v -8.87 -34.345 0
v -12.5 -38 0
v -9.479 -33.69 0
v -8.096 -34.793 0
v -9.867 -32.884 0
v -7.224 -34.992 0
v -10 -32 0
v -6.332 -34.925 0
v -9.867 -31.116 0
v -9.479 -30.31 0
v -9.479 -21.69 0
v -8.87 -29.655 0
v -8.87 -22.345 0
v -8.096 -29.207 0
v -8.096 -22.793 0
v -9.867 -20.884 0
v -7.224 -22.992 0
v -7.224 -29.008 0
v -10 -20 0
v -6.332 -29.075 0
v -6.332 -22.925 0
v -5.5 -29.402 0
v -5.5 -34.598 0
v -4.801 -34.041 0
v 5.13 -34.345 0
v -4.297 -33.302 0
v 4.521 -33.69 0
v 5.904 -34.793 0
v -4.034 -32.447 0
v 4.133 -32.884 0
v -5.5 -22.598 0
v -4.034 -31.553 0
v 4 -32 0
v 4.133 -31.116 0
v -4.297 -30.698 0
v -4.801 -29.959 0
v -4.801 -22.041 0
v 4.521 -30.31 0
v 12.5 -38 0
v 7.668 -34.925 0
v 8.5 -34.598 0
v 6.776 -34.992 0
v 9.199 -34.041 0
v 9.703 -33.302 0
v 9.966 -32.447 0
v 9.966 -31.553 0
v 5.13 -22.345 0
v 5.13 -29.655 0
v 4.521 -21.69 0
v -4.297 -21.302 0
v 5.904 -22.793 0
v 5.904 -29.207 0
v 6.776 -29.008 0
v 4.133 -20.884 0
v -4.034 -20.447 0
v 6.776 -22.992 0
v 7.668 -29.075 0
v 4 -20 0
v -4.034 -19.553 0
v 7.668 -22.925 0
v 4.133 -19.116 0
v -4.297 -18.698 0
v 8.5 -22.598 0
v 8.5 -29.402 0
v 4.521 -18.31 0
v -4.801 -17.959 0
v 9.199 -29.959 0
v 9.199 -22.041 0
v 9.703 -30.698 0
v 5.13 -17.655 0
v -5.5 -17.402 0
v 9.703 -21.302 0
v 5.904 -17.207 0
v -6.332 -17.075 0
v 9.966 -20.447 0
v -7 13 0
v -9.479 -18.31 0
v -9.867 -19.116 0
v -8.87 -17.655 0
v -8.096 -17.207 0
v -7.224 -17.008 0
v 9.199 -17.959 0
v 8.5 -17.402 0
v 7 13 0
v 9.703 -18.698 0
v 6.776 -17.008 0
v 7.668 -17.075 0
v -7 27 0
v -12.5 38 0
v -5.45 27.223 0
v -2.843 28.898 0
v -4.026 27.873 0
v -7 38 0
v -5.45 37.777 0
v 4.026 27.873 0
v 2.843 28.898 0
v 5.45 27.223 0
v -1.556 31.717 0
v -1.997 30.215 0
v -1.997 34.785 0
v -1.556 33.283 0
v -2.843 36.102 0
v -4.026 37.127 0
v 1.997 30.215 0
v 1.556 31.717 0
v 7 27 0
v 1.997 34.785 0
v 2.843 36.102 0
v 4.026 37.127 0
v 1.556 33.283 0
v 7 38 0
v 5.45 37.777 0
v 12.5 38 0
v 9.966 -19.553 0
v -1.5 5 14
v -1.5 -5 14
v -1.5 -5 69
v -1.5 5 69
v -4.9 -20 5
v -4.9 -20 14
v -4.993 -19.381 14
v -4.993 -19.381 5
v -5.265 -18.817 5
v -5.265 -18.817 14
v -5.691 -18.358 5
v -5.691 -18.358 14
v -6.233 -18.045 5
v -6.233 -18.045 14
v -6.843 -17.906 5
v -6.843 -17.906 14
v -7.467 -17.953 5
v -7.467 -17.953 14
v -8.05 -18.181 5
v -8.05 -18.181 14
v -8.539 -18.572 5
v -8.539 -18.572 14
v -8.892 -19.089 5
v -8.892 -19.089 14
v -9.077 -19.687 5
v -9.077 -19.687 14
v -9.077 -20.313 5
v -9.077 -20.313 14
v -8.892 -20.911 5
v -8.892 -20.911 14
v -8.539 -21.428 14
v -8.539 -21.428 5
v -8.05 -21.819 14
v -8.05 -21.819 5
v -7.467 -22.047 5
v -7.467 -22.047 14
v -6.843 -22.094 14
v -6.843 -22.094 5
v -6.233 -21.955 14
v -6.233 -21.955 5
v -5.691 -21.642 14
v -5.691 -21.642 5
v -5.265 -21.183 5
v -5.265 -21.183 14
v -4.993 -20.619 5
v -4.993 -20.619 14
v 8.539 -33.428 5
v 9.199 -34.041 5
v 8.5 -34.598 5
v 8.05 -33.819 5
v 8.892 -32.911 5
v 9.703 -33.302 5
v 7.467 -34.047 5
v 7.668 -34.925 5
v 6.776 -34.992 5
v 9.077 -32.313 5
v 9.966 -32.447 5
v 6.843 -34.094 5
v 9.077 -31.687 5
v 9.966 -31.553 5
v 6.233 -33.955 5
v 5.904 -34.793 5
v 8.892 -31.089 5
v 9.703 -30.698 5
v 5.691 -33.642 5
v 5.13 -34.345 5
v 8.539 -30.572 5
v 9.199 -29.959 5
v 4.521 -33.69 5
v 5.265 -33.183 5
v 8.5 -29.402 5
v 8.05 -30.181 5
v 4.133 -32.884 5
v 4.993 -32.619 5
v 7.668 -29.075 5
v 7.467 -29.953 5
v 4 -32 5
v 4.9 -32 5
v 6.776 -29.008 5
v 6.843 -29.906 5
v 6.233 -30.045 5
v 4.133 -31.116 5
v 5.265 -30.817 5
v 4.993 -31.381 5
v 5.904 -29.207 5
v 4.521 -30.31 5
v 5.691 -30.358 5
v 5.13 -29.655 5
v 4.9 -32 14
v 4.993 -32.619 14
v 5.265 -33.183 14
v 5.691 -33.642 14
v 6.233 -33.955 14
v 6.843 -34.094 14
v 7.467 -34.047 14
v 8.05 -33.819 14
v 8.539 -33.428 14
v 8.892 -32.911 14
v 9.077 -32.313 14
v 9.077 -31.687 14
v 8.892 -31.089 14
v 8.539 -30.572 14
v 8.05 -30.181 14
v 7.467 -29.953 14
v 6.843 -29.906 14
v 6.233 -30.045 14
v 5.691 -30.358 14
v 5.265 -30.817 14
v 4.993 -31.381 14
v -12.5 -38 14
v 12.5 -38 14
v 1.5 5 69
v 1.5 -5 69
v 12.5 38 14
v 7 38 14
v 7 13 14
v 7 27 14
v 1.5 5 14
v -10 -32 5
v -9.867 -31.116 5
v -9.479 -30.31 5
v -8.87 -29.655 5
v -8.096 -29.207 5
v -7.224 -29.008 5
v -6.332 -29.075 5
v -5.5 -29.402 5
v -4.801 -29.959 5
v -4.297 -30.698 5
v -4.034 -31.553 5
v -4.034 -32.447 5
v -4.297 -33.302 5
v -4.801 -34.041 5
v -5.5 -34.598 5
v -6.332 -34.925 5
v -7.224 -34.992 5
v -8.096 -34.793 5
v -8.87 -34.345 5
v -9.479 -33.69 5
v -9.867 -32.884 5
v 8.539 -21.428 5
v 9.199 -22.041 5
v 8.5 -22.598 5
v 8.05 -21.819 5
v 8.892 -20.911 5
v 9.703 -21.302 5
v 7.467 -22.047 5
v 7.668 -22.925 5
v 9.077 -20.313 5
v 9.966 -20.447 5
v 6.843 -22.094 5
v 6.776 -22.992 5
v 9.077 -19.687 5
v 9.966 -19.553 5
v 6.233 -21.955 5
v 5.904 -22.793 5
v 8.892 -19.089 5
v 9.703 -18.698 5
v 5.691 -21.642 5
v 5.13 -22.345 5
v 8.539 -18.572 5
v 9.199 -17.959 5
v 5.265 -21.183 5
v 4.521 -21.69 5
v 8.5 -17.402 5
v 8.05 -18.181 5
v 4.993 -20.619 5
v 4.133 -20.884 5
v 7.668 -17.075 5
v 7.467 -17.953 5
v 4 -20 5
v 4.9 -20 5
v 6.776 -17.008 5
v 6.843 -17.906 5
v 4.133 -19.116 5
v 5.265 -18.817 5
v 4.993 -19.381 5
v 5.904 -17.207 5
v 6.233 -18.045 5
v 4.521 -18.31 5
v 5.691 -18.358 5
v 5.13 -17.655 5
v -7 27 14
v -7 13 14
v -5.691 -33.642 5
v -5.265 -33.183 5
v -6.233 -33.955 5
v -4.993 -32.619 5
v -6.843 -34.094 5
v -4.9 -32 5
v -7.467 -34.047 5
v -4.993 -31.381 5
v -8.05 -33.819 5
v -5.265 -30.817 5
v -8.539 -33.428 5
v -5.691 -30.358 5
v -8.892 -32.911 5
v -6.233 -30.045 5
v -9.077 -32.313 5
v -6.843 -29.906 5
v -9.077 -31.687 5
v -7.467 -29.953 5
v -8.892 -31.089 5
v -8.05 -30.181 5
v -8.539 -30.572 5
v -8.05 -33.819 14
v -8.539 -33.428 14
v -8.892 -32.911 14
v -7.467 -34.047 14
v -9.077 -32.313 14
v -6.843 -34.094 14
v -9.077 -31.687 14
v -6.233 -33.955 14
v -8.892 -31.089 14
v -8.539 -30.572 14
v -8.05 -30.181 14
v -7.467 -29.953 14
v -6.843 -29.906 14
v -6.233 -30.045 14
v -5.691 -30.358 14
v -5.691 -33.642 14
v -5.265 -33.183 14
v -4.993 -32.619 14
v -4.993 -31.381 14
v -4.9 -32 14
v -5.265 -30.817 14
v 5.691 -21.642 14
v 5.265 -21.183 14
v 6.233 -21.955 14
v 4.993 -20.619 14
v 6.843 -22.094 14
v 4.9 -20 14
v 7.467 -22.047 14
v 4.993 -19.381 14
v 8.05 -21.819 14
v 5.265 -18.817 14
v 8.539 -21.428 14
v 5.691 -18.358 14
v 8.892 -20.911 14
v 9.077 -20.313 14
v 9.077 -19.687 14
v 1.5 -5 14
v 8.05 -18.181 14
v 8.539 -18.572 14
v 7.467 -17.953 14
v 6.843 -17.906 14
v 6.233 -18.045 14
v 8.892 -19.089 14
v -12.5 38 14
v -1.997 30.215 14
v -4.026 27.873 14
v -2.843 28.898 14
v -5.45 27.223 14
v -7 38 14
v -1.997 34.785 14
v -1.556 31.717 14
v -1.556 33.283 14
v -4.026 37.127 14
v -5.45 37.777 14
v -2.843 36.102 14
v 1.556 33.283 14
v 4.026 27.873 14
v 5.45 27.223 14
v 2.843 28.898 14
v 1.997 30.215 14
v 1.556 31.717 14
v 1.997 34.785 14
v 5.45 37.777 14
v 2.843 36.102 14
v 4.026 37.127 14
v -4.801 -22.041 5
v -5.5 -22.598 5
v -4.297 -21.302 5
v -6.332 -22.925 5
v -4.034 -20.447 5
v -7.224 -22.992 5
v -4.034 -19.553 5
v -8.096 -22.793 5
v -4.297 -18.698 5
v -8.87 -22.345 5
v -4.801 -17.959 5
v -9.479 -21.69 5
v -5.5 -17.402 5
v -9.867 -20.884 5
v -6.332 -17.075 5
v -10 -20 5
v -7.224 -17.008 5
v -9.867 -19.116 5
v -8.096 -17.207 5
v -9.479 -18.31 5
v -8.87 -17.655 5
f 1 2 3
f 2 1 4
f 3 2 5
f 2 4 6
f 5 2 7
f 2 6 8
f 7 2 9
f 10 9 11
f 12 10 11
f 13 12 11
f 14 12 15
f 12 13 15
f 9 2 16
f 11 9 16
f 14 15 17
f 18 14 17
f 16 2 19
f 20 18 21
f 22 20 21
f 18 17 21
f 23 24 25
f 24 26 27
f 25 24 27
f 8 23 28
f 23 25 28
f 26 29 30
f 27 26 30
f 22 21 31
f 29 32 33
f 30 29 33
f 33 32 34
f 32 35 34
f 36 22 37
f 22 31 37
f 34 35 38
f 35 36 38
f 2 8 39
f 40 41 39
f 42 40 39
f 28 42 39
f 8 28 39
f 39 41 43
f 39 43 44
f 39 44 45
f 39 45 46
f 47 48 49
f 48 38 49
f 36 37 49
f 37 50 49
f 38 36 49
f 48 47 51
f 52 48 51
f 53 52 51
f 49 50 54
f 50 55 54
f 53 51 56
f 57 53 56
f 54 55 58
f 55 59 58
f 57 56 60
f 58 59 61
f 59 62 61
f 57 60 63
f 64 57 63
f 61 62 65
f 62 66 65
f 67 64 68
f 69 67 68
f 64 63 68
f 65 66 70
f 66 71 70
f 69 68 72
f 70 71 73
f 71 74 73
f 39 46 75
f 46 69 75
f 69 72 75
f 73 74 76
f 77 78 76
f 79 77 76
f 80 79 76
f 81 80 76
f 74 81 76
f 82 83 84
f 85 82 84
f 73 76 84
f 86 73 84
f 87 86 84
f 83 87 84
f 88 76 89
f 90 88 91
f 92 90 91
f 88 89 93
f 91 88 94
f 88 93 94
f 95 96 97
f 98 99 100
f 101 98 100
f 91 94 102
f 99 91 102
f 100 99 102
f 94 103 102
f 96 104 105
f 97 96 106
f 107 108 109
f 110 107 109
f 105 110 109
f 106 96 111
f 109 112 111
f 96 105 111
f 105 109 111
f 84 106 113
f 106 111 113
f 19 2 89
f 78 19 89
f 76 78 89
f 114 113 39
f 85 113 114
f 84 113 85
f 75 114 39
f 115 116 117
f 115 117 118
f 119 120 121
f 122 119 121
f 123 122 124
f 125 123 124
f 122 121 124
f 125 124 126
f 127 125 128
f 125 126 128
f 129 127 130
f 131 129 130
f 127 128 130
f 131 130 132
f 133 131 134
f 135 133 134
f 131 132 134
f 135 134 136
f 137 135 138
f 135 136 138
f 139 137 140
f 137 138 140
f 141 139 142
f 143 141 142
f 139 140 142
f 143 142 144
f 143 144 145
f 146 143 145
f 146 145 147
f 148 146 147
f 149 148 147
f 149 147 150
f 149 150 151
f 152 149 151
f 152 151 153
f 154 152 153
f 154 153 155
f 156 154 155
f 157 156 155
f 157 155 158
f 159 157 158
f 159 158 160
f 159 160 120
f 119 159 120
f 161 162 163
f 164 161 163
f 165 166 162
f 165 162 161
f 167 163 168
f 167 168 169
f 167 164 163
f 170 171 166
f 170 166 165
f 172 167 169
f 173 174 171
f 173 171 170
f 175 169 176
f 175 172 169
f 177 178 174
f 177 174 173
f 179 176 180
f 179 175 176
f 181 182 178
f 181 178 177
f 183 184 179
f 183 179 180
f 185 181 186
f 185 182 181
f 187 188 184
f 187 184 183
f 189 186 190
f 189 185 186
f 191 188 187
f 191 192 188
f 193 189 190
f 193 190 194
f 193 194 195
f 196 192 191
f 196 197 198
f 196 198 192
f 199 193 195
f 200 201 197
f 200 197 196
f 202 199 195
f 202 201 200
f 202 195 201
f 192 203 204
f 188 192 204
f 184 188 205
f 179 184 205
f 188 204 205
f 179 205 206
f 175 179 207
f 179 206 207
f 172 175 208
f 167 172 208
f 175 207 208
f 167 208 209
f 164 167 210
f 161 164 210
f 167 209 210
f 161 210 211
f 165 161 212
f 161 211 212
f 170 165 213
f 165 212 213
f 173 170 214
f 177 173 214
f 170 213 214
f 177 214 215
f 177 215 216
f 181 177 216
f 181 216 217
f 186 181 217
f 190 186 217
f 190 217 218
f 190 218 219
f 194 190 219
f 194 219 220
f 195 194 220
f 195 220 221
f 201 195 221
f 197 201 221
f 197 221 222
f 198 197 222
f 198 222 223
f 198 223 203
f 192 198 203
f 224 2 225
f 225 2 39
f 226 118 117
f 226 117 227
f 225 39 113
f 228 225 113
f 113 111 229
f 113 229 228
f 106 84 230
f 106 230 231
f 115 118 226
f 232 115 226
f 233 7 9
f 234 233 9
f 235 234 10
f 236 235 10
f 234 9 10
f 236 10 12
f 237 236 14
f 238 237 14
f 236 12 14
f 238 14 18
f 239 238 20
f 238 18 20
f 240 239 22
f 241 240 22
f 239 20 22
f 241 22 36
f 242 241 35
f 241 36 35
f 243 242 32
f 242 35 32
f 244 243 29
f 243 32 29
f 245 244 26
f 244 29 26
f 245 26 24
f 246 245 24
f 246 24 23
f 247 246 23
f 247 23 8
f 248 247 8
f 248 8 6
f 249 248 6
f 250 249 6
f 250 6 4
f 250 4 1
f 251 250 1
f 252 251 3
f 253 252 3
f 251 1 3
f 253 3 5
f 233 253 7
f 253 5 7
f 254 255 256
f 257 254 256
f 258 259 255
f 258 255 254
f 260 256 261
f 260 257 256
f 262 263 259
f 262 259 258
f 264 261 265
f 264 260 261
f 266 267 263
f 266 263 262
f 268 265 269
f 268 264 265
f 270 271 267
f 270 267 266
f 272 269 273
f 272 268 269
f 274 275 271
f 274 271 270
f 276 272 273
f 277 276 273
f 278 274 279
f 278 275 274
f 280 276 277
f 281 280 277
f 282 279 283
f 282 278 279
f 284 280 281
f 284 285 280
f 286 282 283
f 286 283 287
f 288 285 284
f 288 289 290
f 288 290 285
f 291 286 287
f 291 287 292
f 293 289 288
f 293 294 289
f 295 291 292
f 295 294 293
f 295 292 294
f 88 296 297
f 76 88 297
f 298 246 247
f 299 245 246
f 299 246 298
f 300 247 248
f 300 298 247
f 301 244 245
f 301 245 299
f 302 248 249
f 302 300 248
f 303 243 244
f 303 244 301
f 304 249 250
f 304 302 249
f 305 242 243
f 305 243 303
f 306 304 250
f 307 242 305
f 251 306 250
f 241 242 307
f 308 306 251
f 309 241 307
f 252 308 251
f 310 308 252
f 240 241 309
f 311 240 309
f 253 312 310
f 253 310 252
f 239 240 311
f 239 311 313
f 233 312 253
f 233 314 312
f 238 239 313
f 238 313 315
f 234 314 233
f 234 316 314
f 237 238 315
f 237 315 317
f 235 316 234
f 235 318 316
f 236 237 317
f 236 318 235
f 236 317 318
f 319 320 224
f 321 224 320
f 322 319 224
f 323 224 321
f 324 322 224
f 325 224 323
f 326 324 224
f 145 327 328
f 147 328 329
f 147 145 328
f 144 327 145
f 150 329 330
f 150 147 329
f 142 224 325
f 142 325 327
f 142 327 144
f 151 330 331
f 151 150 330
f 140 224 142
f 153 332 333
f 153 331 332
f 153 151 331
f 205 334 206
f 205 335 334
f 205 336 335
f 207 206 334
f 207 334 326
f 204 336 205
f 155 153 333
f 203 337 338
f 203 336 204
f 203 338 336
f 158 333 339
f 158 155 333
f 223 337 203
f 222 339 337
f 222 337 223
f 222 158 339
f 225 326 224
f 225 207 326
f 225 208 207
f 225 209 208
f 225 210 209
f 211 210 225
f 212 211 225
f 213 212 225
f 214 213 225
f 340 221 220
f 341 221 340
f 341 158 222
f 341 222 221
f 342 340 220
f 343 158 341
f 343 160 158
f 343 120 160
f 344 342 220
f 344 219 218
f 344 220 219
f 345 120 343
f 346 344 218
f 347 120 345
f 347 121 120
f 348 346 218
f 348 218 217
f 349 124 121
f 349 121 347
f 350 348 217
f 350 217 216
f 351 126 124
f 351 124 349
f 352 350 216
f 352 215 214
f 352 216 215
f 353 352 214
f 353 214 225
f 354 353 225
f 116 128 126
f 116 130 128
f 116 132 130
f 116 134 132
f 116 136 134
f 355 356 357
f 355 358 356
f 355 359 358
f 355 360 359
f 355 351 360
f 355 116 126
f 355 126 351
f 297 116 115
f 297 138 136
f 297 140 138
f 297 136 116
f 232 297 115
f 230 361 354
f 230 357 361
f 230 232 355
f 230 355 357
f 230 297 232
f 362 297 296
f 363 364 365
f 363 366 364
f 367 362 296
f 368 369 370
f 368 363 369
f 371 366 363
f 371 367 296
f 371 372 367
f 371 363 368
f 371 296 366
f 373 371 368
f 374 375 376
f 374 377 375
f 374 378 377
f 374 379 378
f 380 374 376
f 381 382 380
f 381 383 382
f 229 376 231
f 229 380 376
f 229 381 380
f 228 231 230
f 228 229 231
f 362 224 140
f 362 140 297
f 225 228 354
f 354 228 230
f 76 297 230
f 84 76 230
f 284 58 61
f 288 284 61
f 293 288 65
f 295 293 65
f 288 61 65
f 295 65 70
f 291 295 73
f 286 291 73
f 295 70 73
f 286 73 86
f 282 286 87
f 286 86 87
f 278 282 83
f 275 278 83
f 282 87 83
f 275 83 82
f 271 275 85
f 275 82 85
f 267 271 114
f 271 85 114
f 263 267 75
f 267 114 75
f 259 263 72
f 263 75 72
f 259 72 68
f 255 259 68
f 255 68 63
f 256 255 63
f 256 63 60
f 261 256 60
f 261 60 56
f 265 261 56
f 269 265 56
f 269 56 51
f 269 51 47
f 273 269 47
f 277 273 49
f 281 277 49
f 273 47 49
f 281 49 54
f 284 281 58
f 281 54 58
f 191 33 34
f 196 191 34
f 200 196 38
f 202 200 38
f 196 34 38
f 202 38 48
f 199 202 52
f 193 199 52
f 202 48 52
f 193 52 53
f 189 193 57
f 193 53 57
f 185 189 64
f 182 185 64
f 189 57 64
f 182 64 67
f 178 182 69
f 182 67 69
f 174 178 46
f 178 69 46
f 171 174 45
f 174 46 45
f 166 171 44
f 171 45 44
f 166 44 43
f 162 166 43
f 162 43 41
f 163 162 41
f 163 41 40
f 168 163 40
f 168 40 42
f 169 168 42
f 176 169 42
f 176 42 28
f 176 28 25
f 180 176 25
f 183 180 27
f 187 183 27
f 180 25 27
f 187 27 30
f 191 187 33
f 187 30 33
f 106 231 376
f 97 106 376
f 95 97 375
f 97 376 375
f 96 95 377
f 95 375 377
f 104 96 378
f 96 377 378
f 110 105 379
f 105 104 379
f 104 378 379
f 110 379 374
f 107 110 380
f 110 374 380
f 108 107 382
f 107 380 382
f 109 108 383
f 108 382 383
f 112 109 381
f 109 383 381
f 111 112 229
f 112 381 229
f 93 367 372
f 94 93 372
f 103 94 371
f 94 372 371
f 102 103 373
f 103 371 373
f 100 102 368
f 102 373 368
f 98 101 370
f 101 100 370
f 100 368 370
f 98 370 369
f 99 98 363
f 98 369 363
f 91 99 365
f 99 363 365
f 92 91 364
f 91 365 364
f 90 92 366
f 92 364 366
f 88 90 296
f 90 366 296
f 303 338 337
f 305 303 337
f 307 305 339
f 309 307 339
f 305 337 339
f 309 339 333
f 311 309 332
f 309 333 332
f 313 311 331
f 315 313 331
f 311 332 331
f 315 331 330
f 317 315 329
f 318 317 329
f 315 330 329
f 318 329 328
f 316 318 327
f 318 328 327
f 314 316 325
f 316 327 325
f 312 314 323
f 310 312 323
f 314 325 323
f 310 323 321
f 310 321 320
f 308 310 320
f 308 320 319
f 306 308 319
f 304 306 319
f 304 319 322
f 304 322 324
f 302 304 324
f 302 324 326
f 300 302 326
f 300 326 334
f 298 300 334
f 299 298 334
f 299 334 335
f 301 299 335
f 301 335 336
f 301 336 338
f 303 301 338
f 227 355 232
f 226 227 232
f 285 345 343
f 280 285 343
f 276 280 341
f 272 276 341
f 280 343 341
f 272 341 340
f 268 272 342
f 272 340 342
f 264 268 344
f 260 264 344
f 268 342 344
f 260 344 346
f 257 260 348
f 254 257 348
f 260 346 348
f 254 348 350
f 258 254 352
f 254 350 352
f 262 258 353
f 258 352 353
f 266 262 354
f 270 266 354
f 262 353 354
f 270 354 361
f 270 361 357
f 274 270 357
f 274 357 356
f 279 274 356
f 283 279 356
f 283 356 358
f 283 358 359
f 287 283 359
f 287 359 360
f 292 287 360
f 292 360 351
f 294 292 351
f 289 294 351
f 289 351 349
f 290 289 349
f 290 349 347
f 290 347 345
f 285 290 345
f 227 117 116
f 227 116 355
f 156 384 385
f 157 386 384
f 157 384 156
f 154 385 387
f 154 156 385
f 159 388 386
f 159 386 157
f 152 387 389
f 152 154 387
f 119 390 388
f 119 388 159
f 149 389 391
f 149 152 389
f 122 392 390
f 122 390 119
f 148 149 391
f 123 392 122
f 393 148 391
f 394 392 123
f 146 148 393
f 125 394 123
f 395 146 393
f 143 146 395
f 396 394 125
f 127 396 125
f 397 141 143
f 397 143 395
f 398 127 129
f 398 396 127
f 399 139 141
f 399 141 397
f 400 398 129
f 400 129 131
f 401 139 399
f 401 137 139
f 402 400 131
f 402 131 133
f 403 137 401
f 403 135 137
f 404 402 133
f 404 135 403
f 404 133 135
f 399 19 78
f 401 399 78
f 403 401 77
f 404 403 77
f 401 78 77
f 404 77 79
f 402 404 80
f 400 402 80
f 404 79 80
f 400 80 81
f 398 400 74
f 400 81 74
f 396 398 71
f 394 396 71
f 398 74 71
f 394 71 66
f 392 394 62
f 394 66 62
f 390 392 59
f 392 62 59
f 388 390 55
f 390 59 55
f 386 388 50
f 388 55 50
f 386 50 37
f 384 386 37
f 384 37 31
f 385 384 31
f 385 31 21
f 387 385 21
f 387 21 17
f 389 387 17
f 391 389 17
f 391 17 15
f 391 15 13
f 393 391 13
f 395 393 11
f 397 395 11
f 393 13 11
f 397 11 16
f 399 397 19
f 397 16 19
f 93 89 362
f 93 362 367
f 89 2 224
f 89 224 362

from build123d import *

# Parameters (mm, degrees)
SKETCH_1_W          = 25
SKETCH_1_H          = 76
EXTRUDE_1_DEPTH     = 14
SKETCH_2_W          = 3
SKETCH_2_H          = 10
EXTRUDE_2_DEPTH     = 55
SKETCH_3_R          = 2.1
CUT_EXTRUDE_1_DEPTH = 69.009190555
CUT_EXTRUDE_3_DEPTH = 69.009190555
SKETCH_6_R          = 3
CUT_EXTRUDE_4_DEPTH = 5


with BuildPart() as part:
    # 草图1 → 凸台-拉伸1 (new body)
    with BuildSketch(Plane.XY):
        Rectangle(SKETCH_1_W, SKETCH_1_H)
    extrude(amount=EXTRUDE_1_DEPTH)

    # 草图2 → 凸台-拉伸2 (add)
    with BuildSketch(Plane.XY.offset(14)):
        Rectangle(SKETCH_2_W, SKETCH_2_H)
    extrude(amount=EXTRUDE_2_DEPTH)

    # 草图3 → 切除-拉伸1 (cut, through all)
    with BuildSketch(Plane.XY.offset(14)):
        with Locations((-7, -20)):
            Circle(SKETCH_3_R)
        with Locations((-7, -32)):
            Circle(SKETCH_3_R)
        with Locations(Location((7, -32, 0), (0, 0, 180))):
            Circle(SKETCH_3_R)
        with Locations(Location((7, -20, 0), (0, 0, 180))):
            Circle(SKETCH_3_R)
    extrude(amount=-CUT_EXTRUDE_1_DEPTH, mode=Mode.SUBTRACT)

    # 草图5 → 切除-拉伸3 (cut, through all)
    with BuildSketch(Plane.XY.offset(14)):
        with BuildLine():
            Line((-7, 13), (7, 13))
            Line((7, 13), (7, 27))
            ThreePointArc((7, 27), (1.5, 32.5), (7, 38))
            Line((7, 38), (-7, 38))
            ThreePointArc((-7, 38), (-1.5, 32.5), (-7, 27))
            Line((-7, 27), (-7, 13))
        make_face()
    extrude(amount=-CUT_EXTRUDE_3_DEPTH, mode=Mode.SUBTRACT)

    # 草图6 → 切除-拉伸4 (cut)
    with BuildSketch(Plane(origin=(0, 0, 0), x_dir=(-1, 0, 0), z_dir=(0, 0, -1))):
        with Locations((7, -20)):
            Circle(SKETCH_6_R)
        with Locations((-7, -20)):
            Circle(SKETCH_6_R)
        with Locations((-7, -32)):
            Circle(SKETCH_6_R)
        with Locations((7, -32)):
            Circle(SKETCH_6_R)
    extrude(amount=-CUT_EXTRUDE_4_DEPTH, mode=Mode.SUBTRACT)


solid = part.part
